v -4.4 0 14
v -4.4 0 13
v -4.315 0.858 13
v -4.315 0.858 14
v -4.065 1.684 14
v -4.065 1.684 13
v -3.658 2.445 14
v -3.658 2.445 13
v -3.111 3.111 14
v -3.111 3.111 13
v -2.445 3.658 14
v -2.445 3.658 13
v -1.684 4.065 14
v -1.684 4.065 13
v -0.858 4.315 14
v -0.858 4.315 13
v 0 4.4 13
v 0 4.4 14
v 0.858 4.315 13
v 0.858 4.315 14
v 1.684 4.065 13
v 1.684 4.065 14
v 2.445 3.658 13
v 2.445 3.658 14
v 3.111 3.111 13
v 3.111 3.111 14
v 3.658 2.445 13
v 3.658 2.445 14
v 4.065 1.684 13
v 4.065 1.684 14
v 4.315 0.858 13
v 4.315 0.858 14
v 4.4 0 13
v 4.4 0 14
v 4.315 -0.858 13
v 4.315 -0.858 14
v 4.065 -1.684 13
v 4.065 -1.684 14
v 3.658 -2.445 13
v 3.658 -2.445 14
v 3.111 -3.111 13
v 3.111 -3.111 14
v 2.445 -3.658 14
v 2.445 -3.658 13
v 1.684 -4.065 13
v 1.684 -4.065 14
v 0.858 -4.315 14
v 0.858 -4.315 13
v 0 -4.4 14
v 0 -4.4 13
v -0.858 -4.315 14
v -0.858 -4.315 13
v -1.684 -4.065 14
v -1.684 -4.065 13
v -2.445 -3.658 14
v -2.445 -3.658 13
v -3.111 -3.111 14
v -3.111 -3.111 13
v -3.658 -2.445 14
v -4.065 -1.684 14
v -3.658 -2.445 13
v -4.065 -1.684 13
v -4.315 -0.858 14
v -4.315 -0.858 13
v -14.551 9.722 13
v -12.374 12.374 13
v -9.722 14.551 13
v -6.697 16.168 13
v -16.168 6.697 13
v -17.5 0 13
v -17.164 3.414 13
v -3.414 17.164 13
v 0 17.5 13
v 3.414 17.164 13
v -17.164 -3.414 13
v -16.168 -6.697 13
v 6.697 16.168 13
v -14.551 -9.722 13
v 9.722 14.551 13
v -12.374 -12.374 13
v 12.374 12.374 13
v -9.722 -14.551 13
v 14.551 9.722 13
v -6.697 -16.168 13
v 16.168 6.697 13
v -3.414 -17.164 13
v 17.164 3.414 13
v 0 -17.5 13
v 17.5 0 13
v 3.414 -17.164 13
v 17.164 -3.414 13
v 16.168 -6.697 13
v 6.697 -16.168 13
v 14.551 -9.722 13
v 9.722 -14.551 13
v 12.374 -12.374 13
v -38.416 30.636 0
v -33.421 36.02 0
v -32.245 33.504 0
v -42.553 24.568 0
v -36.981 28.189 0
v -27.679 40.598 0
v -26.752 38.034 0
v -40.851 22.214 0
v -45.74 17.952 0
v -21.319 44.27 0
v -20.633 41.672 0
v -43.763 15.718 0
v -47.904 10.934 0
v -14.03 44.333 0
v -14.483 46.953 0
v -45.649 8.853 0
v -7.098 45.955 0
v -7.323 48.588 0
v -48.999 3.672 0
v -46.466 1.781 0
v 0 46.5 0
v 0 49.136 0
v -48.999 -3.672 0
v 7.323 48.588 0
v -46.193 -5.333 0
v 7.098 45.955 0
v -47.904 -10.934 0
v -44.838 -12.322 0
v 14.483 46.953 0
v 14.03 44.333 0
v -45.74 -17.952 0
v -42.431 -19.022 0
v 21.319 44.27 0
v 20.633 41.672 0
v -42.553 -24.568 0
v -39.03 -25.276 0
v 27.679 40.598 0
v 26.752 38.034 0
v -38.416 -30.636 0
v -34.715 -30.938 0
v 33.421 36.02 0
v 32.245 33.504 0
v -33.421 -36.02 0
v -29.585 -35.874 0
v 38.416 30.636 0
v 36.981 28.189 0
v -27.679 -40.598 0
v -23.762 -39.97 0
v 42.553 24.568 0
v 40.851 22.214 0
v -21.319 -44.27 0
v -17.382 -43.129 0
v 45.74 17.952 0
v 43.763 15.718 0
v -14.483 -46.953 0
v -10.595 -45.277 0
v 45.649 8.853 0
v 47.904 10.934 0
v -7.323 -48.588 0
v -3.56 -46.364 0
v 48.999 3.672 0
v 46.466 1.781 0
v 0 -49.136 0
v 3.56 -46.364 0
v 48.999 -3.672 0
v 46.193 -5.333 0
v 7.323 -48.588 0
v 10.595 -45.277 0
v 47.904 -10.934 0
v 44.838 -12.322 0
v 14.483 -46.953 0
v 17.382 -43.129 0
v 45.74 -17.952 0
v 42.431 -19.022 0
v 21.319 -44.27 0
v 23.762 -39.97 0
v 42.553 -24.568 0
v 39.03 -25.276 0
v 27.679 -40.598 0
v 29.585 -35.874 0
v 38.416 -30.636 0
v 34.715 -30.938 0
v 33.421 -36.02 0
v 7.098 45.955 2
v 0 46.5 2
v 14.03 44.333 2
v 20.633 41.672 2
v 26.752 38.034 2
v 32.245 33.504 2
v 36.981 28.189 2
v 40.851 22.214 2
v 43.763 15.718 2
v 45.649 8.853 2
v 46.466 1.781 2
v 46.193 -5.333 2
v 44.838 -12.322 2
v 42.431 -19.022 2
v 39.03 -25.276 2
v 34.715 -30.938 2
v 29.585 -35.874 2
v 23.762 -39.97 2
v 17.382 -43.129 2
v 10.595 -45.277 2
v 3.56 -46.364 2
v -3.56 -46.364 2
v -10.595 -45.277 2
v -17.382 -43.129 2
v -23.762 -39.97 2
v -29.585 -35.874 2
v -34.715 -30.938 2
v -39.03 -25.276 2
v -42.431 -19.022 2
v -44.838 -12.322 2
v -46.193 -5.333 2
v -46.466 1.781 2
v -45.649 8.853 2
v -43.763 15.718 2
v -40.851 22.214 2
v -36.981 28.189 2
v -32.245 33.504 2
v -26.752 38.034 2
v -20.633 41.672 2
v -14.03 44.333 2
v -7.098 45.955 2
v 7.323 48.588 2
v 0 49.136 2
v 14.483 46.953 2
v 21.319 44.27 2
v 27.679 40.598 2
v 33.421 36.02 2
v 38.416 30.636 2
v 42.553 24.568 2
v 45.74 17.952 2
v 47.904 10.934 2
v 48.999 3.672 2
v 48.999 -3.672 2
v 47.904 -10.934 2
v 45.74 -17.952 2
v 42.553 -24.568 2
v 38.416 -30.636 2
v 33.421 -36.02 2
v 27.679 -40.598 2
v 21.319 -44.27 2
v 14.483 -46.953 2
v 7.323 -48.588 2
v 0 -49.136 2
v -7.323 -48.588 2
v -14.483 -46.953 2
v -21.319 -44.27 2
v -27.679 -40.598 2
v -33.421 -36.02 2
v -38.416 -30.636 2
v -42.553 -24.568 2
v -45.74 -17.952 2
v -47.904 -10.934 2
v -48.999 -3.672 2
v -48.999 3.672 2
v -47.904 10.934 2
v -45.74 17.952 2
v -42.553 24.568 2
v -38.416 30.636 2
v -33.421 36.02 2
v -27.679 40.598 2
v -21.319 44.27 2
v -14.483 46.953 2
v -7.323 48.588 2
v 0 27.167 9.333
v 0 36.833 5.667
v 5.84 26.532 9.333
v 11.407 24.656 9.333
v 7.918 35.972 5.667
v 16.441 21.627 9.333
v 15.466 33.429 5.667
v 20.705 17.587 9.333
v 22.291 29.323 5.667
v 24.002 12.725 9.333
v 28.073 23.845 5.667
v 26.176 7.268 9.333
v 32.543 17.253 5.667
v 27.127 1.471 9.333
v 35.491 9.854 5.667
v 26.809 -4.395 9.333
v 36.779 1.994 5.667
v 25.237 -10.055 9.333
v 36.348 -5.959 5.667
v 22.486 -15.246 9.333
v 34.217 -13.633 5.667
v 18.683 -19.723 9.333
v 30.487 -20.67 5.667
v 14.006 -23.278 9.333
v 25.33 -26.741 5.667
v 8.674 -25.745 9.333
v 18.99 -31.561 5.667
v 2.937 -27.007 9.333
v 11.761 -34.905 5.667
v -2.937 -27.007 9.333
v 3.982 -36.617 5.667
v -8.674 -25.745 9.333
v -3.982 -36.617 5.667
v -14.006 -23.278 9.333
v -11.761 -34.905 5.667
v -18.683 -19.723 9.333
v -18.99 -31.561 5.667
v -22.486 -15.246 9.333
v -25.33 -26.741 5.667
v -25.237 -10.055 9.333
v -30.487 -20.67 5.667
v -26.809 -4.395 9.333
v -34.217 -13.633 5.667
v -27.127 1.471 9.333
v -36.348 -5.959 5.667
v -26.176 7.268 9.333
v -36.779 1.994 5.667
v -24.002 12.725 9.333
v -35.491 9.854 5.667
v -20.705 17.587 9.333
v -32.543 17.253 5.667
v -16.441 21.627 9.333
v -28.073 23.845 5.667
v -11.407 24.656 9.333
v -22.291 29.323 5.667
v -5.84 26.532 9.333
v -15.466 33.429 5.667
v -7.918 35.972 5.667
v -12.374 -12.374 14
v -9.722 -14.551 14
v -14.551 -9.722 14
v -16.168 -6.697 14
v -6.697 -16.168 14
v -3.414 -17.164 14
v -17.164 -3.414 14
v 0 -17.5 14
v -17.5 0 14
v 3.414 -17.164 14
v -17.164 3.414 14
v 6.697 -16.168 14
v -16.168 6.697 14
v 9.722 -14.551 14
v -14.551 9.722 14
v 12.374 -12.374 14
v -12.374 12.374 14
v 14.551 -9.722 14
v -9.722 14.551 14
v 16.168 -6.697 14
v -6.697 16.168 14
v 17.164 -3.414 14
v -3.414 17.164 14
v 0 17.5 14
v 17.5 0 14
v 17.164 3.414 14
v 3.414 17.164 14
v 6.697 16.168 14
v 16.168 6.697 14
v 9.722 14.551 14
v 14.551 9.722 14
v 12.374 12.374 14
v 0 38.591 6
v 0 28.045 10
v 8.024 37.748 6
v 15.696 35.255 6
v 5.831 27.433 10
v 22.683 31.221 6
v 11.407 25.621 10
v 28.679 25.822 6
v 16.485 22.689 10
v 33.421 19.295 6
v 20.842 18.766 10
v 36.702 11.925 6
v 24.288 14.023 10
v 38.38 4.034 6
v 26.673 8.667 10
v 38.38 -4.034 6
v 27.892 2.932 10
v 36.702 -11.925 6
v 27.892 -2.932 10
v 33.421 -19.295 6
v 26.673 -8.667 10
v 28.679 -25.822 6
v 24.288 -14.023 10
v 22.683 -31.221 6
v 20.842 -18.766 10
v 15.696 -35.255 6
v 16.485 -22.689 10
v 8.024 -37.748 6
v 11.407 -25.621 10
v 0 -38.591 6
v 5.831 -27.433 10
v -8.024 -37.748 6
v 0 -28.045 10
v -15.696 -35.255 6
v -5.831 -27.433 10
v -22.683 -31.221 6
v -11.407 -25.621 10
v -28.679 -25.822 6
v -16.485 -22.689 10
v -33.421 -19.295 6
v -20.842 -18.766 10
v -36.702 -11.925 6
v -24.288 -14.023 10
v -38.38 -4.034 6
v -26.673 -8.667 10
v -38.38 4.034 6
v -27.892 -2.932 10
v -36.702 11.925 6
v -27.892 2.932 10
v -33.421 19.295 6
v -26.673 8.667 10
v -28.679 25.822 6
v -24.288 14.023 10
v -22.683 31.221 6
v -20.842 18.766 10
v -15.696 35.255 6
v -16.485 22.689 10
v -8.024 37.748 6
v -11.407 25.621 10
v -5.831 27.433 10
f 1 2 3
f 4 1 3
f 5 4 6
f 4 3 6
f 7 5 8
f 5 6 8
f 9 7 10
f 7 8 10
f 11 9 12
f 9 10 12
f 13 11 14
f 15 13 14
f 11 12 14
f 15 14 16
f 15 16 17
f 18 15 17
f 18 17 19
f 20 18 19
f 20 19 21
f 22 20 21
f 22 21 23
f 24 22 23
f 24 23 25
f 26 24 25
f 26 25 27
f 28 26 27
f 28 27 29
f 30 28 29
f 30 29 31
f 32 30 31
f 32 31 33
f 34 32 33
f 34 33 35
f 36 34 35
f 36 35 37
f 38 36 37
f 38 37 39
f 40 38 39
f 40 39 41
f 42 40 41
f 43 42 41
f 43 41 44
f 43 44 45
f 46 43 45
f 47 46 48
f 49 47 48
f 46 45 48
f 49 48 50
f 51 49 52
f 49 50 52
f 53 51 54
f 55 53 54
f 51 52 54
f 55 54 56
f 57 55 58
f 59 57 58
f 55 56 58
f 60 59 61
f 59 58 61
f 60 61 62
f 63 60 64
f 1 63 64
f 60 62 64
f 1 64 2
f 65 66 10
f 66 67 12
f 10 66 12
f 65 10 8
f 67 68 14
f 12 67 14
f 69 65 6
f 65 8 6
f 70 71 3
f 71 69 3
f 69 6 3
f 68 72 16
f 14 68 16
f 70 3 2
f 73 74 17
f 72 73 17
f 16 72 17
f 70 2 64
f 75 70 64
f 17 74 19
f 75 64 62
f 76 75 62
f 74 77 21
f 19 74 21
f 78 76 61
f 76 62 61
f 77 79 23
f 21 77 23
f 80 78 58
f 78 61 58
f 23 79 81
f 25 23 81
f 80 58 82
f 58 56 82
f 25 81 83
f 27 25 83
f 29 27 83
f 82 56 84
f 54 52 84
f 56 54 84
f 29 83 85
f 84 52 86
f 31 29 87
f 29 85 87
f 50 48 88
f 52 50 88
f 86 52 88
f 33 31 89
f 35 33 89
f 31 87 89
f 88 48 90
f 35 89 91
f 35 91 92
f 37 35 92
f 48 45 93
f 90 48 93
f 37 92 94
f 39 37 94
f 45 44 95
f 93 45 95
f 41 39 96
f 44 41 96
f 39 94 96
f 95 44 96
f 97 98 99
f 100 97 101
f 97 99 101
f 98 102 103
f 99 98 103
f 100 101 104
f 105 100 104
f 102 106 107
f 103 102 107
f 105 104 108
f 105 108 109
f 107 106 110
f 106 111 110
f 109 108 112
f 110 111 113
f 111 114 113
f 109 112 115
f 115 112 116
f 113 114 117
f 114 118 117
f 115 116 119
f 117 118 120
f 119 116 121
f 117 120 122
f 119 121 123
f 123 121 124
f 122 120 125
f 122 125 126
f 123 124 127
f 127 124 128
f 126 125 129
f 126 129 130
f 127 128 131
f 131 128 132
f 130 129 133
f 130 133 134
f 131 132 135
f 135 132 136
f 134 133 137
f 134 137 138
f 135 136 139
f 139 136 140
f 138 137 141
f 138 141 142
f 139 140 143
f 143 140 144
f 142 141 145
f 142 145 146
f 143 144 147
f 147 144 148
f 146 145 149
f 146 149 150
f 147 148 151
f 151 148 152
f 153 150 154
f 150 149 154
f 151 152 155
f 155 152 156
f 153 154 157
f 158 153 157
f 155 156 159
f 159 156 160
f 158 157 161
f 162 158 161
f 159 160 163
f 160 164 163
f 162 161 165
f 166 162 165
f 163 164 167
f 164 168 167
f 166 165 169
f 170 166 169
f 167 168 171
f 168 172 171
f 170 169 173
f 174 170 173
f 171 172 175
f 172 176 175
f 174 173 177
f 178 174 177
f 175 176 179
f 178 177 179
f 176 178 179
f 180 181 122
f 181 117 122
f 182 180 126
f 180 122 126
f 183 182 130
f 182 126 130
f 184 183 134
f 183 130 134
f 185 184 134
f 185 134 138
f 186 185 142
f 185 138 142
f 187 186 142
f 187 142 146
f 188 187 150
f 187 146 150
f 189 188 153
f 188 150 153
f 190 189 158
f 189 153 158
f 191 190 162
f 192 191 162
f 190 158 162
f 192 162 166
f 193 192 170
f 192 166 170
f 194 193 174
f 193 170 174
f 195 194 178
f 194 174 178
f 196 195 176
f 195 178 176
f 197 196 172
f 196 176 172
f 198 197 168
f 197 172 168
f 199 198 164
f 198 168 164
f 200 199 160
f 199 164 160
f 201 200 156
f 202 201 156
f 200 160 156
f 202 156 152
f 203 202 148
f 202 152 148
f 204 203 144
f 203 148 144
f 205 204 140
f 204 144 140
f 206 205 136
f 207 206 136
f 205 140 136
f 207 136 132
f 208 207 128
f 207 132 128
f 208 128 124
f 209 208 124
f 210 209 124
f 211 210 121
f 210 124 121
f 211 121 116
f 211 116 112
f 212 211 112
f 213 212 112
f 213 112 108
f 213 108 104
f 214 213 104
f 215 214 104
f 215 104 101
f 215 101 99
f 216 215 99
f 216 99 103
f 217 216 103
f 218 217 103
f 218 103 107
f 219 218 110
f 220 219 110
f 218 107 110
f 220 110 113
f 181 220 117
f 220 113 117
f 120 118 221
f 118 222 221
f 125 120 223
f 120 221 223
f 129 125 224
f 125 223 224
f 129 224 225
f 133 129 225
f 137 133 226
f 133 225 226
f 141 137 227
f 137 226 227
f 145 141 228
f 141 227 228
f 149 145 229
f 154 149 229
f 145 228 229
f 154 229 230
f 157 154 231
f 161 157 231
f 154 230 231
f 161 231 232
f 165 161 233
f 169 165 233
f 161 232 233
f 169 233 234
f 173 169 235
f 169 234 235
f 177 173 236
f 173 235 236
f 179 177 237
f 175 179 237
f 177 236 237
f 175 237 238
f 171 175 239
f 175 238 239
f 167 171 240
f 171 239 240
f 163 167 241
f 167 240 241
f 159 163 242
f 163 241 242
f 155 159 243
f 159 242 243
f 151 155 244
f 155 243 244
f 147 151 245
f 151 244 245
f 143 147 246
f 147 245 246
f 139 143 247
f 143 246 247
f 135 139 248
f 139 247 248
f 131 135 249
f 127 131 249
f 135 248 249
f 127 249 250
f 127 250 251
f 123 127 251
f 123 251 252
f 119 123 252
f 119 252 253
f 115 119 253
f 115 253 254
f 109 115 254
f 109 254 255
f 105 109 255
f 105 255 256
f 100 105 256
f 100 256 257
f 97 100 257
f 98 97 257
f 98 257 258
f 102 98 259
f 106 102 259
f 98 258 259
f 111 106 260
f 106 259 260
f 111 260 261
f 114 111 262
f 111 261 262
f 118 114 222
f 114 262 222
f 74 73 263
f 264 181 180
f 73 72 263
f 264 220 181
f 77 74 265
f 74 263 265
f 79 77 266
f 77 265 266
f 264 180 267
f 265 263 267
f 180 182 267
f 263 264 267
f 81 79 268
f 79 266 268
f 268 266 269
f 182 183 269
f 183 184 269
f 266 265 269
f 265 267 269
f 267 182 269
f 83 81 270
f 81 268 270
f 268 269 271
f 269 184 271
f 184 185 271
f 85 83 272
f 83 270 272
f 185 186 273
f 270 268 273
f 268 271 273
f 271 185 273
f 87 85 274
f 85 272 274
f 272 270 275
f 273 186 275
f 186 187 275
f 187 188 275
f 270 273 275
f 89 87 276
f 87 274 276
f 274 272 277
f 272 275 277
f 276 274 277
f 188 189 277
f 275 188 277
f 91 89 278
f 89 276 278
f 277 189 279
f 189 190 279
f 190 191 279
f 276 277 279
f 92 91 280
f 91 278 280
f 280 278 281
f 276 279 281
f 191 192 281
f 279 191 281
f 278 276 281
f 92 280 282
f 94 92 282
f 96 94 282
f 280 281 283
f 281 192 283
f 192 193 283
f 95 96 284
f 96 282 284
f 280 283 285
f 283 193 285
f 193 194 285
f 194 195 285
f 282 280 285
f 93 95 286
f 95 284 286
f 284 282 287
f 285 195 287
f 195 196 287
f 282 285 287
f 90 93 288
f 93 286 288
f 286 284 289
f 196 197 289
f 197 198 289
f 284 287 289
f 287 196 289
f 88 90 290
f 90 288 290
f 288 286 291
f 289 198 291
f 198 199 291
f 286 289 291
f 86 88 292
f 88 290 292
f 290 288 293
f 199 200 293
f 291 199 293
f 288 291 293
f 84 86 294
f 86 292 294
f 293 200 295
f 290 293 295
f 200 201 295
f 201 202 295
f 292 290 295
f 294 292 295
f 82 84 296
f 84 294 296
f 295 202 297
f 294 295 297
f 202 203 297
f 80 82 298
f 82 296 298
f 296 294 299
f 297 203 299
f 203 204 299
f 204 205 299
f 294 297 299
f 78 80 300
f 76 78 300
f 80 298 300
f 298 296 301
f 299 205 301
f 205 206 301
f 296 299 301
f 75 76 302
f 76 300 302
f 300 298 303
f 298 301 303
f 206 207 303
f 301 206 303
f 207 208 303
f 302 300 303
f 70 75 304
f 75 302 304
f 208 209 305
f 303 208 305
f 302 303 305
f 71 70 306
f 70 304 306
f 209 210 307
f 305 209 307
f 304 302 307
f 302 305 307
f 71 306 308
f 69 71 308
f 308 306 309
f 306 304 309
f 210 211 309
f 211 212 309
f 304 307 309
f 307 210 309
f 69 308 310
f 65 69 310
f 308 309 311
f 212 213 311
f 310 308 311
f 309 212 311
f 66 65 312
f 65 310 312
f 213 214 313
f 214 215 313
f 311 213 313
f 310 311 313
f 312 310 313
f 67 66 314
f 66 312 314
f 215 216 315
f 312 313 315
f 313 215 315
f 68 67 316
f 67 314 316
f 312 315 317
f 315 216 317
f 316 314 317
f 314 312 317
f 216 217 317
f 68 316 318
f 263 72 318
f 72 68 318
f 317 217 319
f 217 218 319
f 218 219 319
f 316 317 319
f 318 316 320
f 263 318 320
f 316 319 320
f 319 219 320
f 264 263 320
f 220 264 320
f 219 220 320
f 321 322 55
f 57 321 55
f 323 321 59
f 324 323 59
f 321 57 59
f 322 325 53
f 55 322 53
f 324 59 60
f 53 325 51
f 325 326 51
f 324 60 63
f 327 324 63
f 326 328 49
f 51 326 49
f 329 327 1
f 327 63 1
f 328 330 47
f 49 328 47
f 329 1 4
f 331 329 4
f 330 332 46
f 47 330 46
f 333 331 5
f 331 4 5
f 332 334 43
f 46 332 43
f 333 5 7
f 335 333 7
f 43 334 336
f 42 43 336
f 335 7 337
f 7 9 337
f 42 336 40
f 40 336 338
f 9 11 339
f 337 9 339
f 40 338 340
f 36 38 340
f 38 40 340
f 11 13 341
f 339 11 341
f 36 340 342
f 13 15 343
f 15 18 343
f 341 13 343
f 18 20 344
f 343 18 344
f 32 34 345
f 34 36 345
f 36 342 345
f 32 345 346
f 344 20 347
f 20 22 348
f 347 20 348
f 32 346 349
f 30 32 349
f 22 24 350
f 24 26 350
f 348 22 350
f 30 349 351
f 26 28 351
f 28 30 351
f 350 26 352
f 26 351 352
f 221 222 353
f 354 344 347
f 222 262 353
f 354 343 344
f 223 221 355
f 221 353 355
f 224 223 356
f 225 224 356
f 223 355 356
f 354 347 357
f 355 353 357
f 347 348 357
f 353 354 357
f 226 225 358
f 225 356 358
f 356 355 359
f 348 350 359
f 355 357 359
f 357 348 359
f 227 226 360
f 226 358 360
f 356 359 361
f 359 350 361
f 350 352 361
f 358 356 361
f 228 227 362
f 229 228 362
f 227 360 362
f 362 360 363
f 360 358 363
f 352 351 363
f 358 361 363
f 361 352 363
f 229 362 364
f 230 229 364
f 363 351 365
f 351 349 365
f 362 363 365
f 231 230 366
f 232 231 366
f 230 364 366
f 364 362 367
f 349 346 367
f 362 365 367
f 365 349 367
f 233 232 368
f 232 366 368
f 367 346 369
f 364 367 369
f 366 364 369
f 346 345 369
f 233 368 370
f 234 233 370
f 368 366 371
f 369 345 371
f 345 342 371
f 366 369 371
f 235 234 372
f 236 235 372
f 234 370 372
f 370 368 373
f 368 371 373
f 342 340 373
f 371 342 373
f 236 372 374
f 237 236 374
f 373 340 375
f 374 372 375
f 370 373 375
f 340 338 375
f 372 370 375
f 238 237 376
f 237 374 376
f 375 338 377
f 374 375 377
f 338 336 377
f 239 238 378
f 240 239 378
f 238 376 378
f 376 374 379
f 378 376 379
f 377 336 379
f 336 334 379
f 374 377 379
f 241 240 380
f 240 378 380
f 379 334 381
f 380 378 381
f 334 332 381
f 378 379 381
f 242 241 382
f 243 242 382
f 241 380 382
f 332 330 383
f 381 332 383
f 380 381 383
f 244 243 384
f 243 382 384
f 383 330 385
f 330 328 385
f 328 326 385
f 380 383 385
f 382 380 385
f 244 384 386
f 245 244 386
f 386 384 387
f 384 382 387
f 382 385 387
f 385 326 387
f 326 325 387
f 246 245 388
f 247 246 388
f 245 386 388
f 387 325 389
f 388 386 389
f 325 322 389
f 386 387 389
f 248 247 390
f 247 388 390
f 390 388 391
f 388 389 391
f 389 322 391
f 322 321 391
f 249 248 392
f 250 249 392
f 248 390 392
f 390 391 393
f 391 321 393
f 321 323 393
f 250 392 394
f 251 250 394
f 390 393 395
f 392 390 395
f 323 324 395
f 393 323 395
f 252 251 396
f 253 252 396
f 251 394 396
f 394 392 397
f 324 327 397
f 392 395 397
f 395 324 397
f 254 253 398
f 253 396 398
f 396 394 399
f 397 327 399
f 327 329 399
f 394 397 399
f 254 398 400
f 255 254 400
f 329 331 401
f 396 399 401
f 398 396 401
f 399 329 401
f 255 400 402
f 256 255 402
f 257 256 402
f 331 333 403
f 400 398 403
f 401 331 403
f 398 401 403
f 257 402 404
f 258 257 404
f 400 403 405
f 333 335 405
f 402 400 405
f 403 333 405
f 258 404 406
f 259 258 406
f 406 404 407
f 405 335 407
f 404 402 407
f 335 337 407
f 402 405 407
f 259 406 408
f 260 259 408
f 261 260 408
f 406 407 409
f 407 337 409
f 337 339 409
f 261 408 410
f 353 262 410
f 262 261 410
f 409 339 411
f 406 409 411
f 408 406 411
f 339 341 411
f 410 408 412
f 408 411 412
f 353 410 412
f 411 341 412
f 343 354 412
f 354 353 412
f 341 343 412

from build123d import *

# Parameters (mm, degrees)
F3_D = 8.8


with BuildPart() as f1:
    # F0 (on Right) → F1 (revolve)
    with BuildSketch(Plane.YZ):
        Polygon((46.5, 2), (46.5, 0), (49.1363636364, 0), (49.1363636364, 2), (17.5, 14), (0, 14), (0, 13), (17.5, 13), align=None)
    revolve(axis=Axis((0, 0, 13.5), (0, 0, -1)))

    # F3 (through all)
    with Locations(Plane.XY.offset(14)):
        with Locations((0, 0)):
            Hole(F3_D / 2)


solid = f1.part
